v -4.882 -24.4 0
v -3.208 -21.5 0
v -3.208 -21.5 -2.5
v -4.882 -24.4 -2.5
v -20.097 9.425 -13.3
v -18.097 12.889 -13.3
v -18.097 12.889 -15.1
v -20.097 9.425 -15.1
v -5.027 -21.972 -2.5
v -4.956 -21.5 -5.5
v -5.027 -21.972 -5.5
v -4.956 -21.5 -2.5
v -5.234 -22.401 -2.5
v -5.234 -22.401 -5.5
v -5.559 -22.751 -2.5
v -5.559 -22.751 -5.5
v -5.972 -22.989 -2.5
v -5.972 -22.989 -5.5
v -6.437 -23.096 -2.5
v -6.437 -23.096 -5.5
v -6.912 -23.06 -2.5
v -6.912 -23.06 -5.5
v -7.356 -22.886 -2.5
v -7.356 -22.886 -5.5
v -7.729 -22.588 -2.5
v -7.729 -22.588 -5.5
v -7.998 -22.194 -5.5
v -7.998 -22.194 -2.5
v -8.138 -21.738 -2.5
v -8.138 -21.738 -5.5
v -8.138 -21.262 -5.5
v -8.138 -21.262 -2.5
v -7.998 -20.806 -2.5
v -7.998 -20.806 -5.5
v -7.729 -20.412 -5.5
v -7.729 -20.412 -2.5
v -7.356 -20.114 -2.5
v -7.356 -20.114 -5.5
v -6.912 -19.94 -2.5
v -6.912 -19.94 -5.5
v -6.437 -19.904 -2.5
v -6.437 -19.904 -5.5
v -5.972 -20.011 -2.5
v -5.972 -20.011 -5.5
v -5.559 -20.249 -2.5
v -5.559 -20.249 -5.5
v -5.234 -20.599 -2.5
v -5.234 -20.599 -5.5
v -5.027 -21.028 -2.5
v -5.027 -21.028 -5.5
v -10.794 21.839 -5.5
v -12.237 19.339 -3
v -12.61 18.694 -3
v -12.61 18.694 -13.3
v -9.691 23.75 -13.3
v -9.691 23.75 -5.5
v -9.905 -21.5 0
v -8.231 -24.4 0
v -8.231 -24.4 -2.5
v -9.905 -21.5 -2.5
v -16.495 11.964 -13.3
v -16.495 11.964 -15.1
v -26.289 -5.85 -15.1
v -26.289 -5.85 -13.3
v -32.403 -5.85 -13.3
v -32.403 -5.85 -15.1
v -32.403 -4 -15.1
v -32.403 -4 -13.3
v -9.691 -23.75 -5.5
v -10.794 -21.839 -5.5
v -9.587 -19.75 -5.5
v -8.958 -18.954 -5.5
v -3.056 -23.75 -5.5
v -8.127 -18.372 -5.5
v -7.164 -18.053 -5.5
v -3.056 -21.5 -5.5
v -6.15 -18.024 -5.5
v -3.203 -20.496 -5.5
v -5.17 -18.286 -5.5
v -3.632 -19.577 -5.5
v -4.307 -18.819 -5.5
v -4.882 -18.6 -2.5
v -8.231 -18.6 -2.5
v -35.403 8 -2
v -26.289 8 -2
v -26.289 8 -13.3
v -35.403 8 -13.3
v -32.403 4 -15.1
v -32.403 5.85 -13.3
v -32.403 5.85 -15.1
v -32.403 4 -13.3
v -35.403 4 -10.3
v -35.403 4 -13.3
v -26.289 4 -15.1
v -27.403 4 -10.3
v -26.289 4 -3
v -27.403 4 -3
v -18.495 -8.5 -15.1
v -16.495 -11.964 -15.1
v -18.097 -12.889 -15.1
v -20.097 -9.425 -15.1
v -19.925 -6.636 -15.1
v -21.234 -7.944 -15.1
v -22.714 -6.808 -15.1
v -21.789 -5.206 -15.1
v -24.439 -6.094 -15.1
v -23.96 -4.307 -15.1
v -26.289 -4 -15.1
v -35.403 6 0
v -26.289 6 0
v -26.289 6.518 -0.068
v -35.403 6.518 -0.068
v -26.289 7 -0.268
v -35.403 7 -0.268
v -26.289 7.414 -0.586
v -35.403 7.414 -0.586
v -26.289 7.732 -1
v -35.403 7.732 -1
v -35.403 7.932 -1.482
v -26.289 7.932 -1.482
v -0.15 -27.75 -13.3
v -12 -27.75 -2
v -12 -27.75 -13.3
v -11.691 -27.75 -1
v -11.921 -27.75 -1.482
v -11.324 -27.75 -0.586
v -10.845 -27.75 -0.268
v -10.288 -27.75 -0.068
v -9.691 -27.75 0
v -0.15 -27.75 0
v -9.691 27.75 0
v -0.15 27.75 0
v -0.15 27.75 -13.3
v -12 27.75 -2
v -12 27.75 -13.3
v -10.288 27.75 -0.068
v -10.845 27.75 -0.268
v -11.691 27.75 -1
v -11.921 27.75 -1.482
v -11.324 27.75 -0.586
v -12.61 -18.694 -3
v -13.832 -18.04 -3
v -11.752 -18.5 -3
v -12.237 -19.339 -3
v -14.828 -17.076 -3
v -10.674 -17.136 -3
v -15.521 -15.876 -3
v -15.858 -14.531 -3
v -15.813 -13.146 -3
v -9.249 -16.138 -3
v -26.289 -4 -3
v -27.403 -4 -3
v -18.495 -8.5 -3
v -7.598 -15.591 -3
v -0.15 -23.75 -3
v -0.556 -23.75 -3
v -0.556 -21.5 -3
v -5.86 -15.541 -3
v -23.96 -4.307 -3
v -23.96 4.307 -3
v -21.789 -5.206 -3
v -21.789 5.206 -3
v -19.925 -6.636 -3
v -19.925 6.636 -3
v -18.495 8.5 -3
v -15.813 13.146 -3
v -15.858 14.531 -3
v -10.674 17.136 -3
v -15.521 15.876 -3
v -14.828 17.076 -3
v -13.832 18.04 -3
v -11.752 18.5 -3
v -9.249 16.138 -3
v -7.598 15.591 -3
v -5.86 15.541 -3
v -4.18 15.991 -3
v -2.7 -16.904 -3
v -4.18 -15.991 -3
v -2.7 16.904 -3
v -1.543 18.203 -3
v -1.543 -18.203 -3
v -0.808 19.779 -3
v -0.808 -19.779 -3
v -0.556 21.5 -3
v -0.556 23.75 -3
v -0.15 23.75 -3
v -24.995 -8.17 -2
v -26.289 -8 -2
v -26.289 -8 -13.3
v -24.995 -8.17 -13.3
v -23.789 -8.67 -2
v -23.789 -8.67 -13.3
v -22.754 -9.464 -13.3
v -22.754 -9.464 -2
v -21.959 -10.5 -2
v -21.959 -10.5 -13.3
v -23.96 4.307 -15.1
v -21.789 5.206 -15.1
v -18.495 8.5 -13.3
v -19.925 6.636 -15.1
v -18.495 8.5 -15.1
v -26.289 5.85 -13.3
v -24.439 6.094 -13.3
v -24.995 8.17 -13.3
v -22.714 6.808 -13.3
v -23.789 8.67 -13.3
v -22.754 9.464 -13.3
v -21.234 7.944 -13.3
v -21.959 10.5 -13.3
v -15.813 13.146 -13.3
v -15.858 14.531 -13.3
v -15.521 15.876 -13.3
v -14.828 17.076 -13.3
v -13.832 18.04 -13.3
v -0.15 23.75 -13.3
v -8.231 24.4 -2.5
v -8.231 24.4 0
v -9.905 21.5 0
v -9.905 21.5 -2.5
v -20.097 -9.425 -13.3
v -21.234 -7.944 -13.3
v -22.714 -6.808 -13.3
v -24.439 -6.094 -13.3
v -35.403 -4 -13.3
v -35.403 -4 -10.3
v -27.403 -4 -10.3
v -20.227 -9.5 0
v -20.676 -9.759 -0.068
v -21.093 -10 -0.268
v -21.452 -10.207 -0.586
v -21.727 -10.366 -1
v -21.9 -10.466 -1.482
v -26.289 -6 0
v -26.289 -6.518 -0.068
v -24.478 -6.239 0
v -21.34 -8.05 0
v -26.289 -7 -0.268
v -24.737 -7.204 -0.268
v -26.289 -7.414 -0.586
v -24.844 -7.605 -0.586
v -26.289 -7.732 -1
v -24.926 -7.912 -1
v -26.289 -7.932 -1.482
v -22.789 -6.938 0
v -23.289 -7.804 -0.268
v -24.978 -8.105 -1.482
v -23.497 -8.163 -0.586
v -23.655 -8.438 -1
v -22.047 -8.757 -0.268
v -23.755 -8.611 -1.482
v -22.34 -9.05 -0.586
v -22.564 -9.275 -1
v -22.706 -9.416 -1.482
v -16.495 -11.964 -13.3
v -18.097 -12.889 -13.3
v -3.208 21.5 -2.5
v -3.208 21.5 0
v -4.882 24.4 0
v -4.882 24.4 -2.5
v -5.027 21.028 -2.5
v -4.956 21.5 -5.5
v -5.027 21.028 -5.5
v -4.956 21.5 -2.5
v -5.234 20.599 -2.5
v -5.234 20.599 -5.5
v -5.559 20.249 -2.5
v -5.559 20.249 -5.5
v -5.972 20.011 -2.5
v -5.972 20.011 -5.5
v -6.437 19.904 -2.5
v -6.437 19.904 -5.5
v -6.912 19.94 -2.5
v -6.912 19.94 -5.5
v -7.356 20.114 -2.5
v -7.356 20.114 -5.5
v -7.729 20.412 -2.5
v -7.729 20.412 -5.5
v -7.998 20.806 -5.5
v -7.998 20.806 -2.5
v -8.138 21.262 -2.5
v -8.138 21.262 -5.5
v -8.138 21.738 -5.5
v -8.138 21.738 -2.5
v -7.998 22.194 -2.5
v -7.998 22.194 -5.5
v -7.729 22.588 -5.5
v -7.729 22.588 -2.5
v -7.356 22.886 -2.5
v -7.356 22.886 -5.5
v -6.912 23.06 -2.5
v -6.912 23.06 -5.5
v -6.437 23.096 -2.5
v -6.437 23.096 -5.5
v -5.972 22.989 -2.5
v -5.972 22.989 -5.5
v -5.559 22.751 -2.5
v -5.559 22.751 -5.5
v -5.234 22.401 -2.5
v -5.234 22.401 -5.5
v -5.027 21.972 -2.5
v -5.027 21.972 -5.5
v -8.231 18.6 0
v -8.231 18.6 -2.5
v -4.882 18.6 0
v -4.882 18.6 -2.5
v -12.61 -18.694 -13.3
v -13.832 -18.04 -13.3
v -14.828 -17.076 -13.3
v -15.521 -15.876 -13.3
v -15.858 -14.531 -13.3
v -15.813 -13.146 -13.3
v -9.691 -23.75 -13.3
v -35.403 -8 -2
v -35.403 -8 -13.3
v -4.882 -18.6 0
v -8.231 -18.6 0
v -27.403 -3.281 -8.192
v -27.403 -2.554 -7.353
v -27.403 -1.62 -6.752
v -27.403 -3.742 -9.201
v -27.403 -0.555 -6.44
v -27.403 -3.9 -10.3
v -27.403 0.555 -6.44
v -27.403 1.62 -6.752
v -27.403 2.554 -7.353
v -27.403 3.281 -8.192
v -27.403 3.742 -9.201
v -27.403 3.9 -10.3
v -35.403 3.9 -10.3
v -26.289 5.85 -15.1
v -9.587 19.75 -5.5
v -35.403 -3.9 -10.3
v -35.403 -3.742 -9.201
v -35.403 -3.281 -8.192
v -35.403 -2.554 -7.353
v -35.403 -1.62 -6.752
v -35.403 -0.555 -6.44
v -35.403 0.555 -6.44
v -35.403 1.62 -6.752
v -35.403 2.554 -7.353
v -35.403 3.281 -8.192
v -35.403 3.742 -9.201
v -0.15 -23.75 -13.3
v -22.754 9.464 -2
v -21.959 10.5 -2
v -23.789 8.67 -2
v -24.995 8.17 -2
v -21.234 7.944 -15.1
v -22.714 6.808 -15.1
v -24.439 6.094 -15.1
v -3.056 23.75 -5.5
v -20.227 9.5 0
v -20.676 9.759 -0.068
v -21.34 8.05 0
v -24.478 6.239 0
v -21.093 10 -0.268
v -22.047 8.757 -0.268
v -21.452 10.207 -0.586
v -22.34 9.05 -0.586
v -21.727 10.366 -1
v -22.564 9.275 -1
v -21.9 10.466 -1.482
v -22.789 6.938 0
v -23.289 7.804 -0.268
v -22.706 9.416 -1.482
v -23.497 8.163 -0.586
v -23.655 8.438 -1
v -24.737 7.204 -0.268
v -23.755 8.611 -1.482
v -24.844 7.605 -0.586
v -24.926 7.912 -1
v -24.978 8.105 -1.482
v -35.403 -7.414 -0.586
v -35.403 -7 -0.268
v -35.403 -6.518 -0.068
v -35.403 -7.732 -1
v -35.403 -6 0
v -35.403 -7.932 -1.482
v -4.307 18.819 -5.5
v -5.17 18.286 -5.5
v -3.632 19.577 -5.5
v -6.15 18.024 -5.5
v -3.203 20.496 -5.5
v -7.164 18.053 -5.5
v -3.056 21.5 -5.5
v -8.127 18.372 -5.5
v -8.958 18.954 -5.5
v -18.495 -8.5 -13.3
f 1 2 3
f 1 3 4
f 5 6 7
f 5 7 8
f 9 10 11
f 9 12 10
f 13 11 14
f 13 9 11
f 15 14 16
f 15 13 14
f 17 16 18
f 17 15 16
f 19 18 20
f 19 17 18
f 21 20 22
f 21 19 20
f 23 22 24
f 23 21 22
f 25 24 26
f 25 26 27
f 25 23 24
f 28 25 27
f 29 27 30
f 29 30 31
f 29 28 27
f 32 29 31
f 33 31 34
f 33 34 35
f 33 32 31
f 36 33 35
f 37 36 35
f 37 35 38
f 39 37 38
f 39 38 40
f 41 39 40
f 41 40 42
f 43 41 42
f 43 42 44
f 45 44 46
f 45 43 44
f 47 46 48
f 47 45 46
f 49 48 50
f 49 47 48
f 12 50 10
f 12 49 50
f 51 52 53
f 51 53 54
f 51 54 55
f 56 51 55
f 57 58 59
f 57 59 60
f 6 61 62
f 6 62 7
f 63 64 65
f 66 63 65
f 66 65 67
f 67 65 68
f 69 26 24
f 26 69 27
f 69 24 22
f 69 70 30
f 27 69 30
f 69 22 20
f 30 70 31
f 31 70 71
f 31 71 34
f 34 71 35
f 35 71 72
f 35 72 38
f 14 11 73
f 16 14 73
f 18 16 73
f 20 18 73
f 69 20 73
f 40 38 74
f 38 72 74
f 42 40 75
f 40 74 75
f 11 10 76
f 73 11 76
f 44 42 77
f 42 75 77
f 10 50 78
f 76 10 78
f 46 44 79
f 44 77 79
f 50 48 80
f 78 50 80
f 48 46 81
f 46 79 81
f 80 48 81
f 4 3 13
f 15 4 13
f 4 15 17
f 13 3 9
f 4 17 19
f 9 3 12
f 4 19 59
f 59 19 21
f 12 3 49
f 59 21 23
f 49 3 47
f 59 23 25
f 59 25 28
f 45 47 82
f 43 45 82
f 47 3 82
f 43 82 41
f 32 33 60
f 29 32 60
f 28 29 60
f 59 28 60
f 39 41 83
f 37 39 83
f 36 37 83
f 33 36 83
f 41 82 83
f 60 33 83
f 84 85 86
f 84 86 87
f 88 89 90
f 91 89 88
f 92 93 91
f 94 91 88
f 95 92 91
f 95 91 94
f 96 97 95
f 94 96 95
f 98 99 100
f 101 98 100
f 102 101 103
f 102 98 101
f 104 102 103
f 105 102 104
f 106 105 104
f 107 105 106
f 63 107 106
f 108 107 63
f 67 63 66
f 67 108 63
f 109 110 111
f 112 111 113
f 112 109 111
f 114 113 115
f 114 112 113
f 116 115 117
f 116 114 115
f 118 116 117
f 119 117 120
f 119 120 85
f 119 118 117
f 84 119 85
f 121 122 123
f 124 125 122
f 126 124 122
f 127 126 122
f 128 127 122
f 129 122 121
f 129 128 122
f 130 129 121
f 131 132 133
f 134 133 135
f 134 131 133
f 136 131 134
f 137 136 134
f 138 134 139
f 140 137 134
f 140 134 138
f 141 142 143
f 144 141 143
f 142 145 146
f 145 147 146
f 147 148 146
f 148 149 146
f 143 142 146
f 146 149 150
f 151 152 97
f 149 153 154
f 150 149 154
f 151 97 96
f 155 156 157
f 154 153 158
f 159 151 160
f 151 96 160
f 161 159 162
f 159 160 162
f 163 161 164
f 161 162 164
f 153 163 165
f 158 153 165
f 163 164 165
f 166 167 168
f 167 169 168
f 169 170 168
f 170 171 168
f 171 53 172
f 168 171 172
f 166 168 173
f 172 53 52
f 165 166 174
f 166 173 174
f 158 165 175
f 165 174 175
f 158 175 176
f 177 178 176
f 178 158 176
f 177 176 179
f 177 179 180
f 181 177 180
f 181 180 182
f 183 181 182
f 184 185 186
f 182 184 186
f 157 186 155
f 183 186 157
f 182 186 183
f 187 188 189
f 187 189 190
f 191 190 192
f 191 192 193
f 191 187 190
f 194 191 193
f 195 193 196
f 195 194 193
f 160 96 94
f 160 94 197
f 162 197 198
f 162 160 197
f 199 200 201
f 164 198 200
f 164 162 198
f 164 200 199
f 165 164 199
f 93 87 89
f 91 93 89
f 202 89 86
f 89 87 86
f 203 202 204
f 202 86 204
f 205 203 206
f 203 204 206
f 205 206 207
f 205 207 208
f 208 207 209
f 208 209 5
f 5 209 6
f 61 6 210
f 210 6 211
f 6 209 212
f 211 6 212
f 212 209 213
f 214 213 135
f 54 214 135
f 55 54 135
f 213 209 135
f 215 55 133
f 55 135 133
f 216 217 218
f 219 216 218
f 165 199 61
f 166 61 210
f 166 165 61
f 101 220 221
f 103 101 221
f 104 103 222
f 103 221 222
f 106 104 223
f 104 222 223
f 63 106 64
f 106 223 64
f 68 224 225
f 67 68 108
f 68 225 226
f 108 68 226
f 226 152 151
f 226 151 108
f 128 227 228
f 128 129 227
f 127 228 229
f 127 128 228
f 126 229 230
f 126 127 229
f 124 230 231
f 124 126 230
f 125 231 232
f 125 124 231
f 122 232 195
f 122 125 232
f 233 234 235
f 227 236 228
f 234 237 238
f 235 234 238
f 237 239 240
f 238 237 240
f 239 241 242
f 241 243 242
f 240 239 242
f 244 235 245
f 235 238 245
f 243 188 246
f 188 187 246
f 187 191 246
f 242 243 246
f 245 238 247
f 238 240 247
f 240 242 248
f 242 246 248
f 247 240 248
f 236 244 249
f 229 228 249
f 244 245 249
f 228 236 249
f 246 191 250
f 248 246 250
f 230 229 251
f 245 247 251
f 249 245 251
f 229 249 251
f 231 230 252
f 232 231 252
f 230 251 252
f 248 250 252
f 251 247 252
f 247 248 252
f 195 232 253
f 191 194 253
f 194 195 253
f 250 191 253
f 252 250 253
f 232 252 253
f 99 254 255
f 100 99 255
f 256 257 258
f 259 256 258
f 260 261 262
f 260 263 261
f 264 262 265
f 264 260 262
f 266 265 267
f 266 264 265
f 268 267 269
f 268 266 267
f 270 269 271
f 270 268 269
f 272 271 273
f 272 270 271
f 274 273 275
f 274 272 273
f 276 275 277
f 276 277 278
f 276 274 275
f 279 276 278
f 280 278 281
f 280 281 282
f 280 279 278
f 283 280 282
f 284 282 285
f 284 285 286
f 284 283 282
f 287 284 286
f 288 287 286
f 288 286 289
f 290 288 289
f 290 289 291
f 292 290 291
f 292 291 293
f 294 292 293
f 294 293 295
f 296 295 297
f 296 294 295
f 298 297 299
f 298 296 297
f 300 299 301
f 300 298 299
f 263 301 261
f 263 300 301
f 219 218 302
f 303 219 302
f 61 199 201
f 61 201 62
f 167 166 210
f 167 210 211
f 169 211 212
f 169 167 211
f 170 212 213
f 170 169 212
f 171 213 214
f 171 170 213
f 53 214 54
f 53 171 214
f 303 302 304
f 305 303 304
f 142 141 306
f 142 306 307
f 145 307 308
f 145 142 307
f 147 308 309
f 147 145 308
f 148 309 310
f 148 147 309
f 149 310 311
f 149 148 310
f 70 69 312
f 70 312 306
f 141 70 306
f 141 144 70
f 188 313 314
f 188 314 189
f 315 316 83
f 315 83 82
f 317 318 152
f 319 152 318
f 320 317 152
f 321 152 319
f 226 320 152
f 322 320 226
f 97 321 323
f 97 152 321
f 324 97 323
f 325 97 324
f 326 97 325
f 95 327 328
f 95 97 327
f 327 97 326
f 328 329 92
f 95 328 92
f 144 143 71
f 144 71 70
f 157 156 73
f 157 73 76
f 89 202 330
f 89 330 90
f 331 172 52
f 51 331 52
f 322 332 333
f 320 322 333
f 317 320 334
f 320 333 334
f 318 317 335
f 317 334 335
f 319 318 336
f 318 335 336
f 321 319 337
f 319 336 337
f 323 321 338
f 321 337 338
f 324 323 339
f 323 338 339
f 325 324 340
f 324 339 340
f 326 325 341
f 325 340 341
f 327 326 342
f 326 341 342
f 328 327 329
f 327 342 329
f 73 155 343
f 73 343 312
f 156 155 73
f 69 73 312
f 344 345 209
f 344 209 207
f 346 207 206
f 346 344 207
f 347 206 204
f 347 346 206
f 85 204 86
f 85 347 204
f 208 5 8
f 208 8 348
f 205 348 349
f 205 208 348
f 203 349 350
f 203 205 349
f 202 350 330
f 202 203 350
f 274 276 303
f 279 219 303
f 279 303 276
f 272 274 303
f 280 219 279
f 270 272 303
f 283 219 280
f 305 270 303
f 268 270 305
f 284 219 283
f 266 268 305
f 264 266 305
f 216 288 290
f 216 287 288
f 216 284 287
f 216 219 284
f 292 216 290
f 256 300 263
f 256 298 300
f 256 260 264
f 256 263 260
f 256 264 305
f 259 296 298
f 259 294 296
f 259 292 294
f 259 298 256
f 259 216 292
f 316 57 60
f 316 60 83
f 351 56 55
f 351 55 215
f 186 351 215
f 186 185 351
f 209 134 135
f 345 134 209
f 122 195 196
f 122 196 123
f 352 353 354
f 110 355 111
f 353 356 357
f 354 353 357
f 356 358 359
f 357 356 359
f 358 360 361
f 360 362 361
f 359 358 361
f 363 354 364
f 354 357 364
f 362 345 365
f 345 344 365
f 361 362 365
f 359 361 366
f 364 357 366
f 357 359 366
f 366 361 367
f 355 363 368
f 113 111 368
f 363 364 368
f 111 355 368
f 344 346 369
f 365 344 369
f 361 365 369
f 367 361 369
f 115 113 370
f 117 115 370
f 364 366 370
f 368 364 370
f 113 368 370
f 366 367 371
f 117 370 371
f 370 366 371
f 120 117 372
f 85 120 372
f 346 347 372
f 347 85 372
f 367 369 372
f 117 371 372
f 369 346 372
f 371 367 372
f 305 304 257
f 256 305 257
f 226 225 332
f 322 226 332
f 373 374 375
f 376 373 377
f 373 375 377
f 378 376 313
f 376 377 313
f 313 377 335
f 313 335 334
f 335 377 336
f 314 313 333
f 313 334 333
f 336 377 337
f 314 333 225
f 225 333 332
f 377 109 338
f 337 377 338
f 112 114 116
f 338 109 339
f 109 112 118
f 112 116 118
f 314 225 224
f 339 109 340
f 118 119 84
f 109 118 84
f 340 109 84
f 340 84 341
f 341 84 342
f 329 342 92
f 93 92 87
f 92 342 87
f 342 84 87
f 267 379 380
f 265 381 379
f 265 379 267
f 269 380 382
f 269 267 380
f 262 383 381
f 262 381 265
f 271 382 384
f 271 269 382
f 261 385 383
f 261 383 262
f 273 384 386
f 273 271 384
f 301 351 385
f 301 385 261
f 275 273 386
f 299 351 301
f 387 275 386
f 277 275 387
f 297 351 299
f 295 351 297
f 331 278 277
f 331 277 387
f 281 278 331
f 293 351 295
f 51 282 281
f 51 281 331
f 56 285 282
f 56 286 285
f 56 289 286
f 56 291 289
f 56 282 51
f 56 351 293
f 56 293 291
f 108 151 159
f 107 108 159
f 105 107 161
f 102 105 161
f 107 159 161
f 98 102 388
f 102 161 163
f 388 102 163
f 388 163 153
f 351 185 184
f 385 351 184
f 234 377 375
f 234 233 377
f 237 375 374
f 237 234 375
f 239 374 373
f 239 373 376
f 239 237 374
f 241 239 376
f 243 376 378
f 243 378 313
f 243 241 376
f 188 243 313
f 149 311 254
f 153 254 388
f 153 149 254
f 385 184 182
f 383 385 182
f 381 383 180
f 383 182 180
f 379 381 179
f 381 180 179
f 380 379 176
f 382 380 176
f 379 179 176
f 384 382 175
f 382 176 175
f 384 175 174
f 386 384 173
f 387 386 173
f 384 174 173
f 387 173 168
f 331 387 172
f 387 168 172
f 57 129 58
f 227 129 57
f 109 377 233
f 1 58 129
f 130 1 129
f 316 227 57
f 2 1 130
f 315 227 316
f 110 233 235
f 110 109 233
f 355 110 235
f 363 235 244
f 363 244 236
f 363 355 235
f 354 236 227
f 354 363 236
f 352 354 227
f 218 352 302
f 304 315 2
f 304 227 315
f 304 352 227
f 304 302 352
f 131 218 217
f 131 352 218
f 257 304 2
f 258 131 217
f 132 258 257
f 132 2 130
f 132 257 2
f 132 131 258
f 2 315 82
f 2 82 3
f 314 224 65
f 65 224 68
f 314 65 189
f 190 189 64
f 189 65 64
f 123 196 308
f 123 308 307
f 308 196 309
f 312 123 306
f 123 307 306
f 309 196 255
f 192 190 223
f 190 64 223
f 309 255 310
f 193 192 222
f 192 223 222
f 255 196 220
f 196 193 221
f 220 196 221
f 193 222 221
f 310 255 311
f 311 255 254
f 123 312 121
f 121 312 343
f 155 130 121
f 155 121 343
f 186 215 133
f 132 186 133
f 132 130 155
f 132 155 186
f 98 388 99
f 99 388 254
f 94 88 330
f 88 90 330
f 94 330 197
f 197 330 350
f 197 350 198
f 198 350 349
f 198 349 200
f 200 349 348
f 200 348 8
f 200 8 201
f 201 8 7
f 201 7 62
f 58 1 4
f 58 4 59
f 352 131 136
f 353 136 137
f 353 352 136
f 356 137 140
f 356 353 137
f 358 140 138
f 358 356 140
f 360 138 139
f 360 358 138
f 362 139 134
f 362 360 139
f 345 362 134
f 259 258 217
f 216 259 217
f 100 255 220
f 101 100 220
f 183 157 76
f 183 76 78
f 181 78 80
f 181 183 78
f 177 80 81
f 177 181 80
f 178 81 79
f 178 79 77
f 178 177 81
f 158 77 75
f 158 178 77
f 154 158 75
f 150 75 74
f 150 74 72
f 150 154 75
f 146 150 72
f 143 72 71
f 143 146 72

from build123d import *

# Parameters (mm, degrees)
EXTRUDE_1_DEPTH     = 3
EXTRUDE_2_DEPTH     = 10.3
EXTRUDE_3_DEPTH     = 1.8
FILLET_1_R          = 2
CUT_EXTRUDE_1_DEPTH = 2.5
CUT_EXTRUDE_2_REACH = 49.449
SKETCH_7_R          = 1.6
SKETCH_8_R          = 1.6
EXTRUDE_4_DEPTH     = 2.5
CHAMFER_1_SIZE      = 2.5
EXTRUDE_5_DEPTH     = 8


with BuildPart() as part:
    # Эскиз3 → Бобышка-Вытянуть1 (new body)
    with BuildSketch(Plane.XY):
        with BuildLine():
            Line((-35.402667816, -8), (-26.289419162, -8))
            ThreePointArc((-26.289419162, -8), (-23.789419162, -8.669872981), (-21.959292144, -10.5))
            Line((-21.959292144, -10.5), (-12, -27.75))
            Line((-12, -27.75), (-0.15, -27.75))
            Line((-0.15, -27.75), (-0.15, 27.75))
            Line((-0.15, 27.75), (-12, 27.75))
            Line((-12, 27.75), (-21.959292144, 10.5))
            ThreePointArc((-21.959292144, 10.5), (-23.789419162, 8.669872981), (-26.289419162, 8))
            Line((-26.289419162, 8), (-35.402667816, 8))
            Line((-35.402667816, 8), (-35.402667816, -8))
        make_face()
    extrude(amount=-EXTRUDE_1_DEPTH)

    # Эскиз4 → Бобышка-Вытянуть2 (add)
    with BuildSketch(Plane(origin=(0, 0, -3), x_dir=(-1, 0, 0), z_dir=(0, 0, -1))):
        with BuildLine():
            Line((12, -27.75), (0.15, -27.75))
            Line((0.15, -27.75), (0.15, -23.75))
            Line((0.15, -23.75), (9.690598923, -23.75))
            Line((9.690598923, -23.75), (12.609925056, -18.693578815))
            ThreePointArc((12.609925056, -18.693578815), (15.216591048, -16.5), (15.81295303, -13.145771625))
            Line((15.81295303, -13.145771625), (18.495190528, -8.5))
            ThreePointArc((18.495190528, -8.5), (21.789419162, -5.205771366), (26.289419162, -4))
            Line((26.289419162, -4), (35.402667816, -4))
            Line((35.402667816, -4), (35.402667816, -8))
            Line((35.402667816, -8), (26.289419162, -8))
            ThreePointArc((26.289419162, -8), (23.789419162, -8.669872981), (21.959292144, -10.5))
            Line((21.959292144, -10.5), (12, -27.75))
        make_face()
        with BuildLine():
            Line((26.289419162, 8), (35.402667816, 8))
            Line((35.402667816, 8), (35.402667816, 4))
            Line((35.402667816, 4), (26.289419162, 4))
            ThreePointArc((26.289419162, 4), (21.789419162, 5.205771366), (18.495190528, 8.5))
            Line((18.495190528, 8.5), (15.81295303, 13.145771625))
            ThreePointArc((15.81295303, 13.145771625), (15.216591048, 16.5), (12.609925056, 18.693578815))
            Line((12.609925056, 18.693578815), (9.690598923, 23.75))
            Line((9.690598923, 23.75), (0.15, 23.75))
            Line((0.15, 23.75), (0.15, 27.75))
            Line((0.15, 27.75), (12, 27.75))
            Line((12, 27.75), (21.959292144, 10.5))
            ThreePointArc((21.959292144, 10.5), (23.789419162, 8.669872981), (26.289419162, 8))
        make_face()
    extrude(amount=EXTRUDE_2_DEPTH)

    # Эскиз5 → Бобышка-Вытянуть3 (add)
    with BuildSketch(Plane(origin=(0, 0, -13.3), x_dir=(-1, 0, 0), z_dir=(0, 0, -1))):
        with BuildLine():
            Line((18.495190528, -8.5), (16.495190528, -11.964101615))
            Line((16.495190528, -11.964101615), (18.097337525, -12.889101615))
            Line((18.097337525, -12.889101615), (20.097337525, -9.425))
            ThreePointArc((20.097337525, -9.425), (22.714419162, -6.807918363), (26.289419162, -5.85))
            Line((26.289419162, -5.85), (32.402667816, -5.85))
            Line((32.402667816, -5.85), (32.402667816, -4))
            Line((32.402667816, -4), (26.289419162, -4))
            ThreePointArc((26.289419162, -4), (21.789419162, -5.205771366), (18.495190528, -8.5))
        make_face()
        with BuildLine():
            Line((32.402667816, 4), (26.289419162, 4))
            ThreePointArc((26.289419162, 4), (21.789419162, 5.205771366), (18.495190528, 8.5))
            Line((18.495190528, 8.5), (16.495190528, 11.964101615))
            Line((16.495190528, 11.964101615), (18.097337525, 12.889101615))
            Line((18.097337525, 12.889101615), (20.097337525, 9.425))
            ThreePointArc((20.097337525, 9.425), (22.714419162, 6.807918363), (26.289419162, 5.85))
            Line((26.289419162, 5.85), (32.402667816, 5.85))
            Line((32.402667816, 5.85), (32.402667816, 4))
        make_face()
    extrude(amount=EXTRUDE_3_DEPTH)

    # Скругление1
    fillet_1_edges = [part.edges().sort_by_distance(p)[0] for p in [
        (-30.846043489, 8, 0),
        (-23.789419162, 8.669872981, 0),
        (-16.979646072, 19.125, 0),
        (-16.979646072, -19.125, 0),
        (-23.789419162, -8.669872981, 0),
        (-30.846043489, -8, 0),
    ]]
    fillet(fillet_1_edges, radius=FILLET_1_R)

    # Эскиз6 → Вырез-Вытянуть1 (cut)
    with BuildSketch(Plane.XY):
        Polygon((-8.230652791, 24.4), (-9.904968571, 21.5), (-8.230652791, 18.6), (-4.882021229, 18.6), (-3.207705449, 21.5), (-4.882021229, 24.4), align=None)
        Polygon((-4.882021229, -24.4), (-8.230652791, -24.4), (-9.904968571, -21.5), (-8.230652791, -18.6), (-4.882021229, -18.6), (-3.207705449, -21.5), align=None)
    extrude(amount=-CUT_EXTRUDE_1_DEPTH, mode=Mode.SUBTRACT)

    # Эскиз7 → Вырез-Вытянуть2 (cut, up to next)
    with BuildSketch(Plane.XY, mode=Mode.PRIVATE) as cut_extrude_2_sk1:
        with Locations((-6.55633701, 21.5)):
            Circle(SKETCH_7_R)
    cut_extrude_2_tool1 = extrude(cut_extrude_2_sk1.sketch, amount=-CUT_EXTRUDE_2_REACH, mode=Mode.PRIVATE) & part.part
    # Эскиз7 → Вырез-Вытянуть2 (cut, up to next)
    with BuildSketch(Plane.XY, mode=Mode.PRIVATE) as cut_extrude_2_sk2:
        with Locations((-6.55633701, -21.5)):
            Circle(SKETCH_7_R)
    cut_extrude_2_tool2 = extrude(cut_extrude_2_sk2.sketch, amount=-CUT_EXTRUDE_2_REACH, mode=Mode.PRIVATE) & part.part
    add(cut_extrude_2_tool1.solids().sort_by_distance((-6.556337, 21.5, 0))[0], mode=Mode.SUBTRACT)
    add(cut_extrude_2_tool2.solids().sort_by_distance((-6.556337, -21.5, 0))[0], mode=Mode.SUBTRACT)

    # Эскиз8 → Бобышка-Вытянуть4 (add)
    # profile 1 of 2: a face of its own
    with BuildSketch(Plane(origin=(0, 0, -3), x_dir=(-1, 0, 0), z_dir=(0, 0, -1))):
        with BuildLine():
            Line((9.587425923, 19.75), (10.793712962, 21.839350439))
            Line((10.793712962, 21.839350439), (9.690598923, 23.75))
            Line((9.690598923, 23.75), (3.05633701, 23.75))
            Line((3.05633701, 23.75), (3.05633701, 21.5))
            ThreePointArc((3.05633701, 21.5), (5.650470352, 18.119259608), (9.587425923, 19.75))
        make_face()
        with Locations(Location((6.55633701, 21.5, 0), (0, 0, 180))):
            Circle(SKETCH_8_R, mode=Mode.SUBTRACT)
    # profile 2 of 2: a face of its own
    with BuildSketch(Plane(origin=(0, 0, -3), x_dir=(-1, 0, 0), z_dir=(0, 0, -1))):
        with BuildLine():
            Line((3.05633701, -23.75), (3.05633701, -21.5))
            ThreePointArc((3.05633701, -21.5), (5.650470352, -18.119259608), (9.587425923, -19.75))
            Line((9.587425923, -19.75), (10.793712962, -21.839350439))
            Line((10.793712962, -21.839350439), (9.690598923, -23.75))
            Line((9.690598923, -23.75), (3.05633701, -23.75))
        make_face()
        with Locations(Location((6.55633701, -21.5, 0), (0, 0, 180))):
            Circle(SKETCH_8_R, mode=Mode.SUBTRACT)
    extrude(amount=EXTRUDE_4_DEPTH)

    # Фаска1
    chamfer_1_edges = [part.edges().sort_by_distance(p)[0] for p in [
        (-10.190569442, -20.79467522, -3),
        (-3.05633701, -22.625, -3),
        (-5.650470352, -18.119259608, -3),
        (-3.05633701, 22.625, -3),
        (-10.190569442, 20.79467522, -3),
        (-5.650470352, 18.119259608, -3),
    ]]
    chamfer(chamfer_1_edges, length=CHAMFER_1_SIZE - 0.0001)  # a hair under: the kernel refuses the full size

    # Эскиз10 → Бобышка-Вытянуть5 (add)
    with BuildSketch(Plane.ZY.offset(35.402667816)):
        with BuildLine():
            Line((-10.3, 4), (-3, 4))
            Line((-3, 4), (-3, -4))
            Line((-3, -4), (-10.3, -4))
            Line((-10.3, -4), (-10.3, -3.9))
            ThreePointArc((-10.3, -3.9), (-6.4, 0), (-10.3, 3.9))
            Line((-10.3, 3.9), (-10.3, 4))
        make_face()
    extrude(amount=-EXTRUDE_5_DEPTH)


solid = part.part
